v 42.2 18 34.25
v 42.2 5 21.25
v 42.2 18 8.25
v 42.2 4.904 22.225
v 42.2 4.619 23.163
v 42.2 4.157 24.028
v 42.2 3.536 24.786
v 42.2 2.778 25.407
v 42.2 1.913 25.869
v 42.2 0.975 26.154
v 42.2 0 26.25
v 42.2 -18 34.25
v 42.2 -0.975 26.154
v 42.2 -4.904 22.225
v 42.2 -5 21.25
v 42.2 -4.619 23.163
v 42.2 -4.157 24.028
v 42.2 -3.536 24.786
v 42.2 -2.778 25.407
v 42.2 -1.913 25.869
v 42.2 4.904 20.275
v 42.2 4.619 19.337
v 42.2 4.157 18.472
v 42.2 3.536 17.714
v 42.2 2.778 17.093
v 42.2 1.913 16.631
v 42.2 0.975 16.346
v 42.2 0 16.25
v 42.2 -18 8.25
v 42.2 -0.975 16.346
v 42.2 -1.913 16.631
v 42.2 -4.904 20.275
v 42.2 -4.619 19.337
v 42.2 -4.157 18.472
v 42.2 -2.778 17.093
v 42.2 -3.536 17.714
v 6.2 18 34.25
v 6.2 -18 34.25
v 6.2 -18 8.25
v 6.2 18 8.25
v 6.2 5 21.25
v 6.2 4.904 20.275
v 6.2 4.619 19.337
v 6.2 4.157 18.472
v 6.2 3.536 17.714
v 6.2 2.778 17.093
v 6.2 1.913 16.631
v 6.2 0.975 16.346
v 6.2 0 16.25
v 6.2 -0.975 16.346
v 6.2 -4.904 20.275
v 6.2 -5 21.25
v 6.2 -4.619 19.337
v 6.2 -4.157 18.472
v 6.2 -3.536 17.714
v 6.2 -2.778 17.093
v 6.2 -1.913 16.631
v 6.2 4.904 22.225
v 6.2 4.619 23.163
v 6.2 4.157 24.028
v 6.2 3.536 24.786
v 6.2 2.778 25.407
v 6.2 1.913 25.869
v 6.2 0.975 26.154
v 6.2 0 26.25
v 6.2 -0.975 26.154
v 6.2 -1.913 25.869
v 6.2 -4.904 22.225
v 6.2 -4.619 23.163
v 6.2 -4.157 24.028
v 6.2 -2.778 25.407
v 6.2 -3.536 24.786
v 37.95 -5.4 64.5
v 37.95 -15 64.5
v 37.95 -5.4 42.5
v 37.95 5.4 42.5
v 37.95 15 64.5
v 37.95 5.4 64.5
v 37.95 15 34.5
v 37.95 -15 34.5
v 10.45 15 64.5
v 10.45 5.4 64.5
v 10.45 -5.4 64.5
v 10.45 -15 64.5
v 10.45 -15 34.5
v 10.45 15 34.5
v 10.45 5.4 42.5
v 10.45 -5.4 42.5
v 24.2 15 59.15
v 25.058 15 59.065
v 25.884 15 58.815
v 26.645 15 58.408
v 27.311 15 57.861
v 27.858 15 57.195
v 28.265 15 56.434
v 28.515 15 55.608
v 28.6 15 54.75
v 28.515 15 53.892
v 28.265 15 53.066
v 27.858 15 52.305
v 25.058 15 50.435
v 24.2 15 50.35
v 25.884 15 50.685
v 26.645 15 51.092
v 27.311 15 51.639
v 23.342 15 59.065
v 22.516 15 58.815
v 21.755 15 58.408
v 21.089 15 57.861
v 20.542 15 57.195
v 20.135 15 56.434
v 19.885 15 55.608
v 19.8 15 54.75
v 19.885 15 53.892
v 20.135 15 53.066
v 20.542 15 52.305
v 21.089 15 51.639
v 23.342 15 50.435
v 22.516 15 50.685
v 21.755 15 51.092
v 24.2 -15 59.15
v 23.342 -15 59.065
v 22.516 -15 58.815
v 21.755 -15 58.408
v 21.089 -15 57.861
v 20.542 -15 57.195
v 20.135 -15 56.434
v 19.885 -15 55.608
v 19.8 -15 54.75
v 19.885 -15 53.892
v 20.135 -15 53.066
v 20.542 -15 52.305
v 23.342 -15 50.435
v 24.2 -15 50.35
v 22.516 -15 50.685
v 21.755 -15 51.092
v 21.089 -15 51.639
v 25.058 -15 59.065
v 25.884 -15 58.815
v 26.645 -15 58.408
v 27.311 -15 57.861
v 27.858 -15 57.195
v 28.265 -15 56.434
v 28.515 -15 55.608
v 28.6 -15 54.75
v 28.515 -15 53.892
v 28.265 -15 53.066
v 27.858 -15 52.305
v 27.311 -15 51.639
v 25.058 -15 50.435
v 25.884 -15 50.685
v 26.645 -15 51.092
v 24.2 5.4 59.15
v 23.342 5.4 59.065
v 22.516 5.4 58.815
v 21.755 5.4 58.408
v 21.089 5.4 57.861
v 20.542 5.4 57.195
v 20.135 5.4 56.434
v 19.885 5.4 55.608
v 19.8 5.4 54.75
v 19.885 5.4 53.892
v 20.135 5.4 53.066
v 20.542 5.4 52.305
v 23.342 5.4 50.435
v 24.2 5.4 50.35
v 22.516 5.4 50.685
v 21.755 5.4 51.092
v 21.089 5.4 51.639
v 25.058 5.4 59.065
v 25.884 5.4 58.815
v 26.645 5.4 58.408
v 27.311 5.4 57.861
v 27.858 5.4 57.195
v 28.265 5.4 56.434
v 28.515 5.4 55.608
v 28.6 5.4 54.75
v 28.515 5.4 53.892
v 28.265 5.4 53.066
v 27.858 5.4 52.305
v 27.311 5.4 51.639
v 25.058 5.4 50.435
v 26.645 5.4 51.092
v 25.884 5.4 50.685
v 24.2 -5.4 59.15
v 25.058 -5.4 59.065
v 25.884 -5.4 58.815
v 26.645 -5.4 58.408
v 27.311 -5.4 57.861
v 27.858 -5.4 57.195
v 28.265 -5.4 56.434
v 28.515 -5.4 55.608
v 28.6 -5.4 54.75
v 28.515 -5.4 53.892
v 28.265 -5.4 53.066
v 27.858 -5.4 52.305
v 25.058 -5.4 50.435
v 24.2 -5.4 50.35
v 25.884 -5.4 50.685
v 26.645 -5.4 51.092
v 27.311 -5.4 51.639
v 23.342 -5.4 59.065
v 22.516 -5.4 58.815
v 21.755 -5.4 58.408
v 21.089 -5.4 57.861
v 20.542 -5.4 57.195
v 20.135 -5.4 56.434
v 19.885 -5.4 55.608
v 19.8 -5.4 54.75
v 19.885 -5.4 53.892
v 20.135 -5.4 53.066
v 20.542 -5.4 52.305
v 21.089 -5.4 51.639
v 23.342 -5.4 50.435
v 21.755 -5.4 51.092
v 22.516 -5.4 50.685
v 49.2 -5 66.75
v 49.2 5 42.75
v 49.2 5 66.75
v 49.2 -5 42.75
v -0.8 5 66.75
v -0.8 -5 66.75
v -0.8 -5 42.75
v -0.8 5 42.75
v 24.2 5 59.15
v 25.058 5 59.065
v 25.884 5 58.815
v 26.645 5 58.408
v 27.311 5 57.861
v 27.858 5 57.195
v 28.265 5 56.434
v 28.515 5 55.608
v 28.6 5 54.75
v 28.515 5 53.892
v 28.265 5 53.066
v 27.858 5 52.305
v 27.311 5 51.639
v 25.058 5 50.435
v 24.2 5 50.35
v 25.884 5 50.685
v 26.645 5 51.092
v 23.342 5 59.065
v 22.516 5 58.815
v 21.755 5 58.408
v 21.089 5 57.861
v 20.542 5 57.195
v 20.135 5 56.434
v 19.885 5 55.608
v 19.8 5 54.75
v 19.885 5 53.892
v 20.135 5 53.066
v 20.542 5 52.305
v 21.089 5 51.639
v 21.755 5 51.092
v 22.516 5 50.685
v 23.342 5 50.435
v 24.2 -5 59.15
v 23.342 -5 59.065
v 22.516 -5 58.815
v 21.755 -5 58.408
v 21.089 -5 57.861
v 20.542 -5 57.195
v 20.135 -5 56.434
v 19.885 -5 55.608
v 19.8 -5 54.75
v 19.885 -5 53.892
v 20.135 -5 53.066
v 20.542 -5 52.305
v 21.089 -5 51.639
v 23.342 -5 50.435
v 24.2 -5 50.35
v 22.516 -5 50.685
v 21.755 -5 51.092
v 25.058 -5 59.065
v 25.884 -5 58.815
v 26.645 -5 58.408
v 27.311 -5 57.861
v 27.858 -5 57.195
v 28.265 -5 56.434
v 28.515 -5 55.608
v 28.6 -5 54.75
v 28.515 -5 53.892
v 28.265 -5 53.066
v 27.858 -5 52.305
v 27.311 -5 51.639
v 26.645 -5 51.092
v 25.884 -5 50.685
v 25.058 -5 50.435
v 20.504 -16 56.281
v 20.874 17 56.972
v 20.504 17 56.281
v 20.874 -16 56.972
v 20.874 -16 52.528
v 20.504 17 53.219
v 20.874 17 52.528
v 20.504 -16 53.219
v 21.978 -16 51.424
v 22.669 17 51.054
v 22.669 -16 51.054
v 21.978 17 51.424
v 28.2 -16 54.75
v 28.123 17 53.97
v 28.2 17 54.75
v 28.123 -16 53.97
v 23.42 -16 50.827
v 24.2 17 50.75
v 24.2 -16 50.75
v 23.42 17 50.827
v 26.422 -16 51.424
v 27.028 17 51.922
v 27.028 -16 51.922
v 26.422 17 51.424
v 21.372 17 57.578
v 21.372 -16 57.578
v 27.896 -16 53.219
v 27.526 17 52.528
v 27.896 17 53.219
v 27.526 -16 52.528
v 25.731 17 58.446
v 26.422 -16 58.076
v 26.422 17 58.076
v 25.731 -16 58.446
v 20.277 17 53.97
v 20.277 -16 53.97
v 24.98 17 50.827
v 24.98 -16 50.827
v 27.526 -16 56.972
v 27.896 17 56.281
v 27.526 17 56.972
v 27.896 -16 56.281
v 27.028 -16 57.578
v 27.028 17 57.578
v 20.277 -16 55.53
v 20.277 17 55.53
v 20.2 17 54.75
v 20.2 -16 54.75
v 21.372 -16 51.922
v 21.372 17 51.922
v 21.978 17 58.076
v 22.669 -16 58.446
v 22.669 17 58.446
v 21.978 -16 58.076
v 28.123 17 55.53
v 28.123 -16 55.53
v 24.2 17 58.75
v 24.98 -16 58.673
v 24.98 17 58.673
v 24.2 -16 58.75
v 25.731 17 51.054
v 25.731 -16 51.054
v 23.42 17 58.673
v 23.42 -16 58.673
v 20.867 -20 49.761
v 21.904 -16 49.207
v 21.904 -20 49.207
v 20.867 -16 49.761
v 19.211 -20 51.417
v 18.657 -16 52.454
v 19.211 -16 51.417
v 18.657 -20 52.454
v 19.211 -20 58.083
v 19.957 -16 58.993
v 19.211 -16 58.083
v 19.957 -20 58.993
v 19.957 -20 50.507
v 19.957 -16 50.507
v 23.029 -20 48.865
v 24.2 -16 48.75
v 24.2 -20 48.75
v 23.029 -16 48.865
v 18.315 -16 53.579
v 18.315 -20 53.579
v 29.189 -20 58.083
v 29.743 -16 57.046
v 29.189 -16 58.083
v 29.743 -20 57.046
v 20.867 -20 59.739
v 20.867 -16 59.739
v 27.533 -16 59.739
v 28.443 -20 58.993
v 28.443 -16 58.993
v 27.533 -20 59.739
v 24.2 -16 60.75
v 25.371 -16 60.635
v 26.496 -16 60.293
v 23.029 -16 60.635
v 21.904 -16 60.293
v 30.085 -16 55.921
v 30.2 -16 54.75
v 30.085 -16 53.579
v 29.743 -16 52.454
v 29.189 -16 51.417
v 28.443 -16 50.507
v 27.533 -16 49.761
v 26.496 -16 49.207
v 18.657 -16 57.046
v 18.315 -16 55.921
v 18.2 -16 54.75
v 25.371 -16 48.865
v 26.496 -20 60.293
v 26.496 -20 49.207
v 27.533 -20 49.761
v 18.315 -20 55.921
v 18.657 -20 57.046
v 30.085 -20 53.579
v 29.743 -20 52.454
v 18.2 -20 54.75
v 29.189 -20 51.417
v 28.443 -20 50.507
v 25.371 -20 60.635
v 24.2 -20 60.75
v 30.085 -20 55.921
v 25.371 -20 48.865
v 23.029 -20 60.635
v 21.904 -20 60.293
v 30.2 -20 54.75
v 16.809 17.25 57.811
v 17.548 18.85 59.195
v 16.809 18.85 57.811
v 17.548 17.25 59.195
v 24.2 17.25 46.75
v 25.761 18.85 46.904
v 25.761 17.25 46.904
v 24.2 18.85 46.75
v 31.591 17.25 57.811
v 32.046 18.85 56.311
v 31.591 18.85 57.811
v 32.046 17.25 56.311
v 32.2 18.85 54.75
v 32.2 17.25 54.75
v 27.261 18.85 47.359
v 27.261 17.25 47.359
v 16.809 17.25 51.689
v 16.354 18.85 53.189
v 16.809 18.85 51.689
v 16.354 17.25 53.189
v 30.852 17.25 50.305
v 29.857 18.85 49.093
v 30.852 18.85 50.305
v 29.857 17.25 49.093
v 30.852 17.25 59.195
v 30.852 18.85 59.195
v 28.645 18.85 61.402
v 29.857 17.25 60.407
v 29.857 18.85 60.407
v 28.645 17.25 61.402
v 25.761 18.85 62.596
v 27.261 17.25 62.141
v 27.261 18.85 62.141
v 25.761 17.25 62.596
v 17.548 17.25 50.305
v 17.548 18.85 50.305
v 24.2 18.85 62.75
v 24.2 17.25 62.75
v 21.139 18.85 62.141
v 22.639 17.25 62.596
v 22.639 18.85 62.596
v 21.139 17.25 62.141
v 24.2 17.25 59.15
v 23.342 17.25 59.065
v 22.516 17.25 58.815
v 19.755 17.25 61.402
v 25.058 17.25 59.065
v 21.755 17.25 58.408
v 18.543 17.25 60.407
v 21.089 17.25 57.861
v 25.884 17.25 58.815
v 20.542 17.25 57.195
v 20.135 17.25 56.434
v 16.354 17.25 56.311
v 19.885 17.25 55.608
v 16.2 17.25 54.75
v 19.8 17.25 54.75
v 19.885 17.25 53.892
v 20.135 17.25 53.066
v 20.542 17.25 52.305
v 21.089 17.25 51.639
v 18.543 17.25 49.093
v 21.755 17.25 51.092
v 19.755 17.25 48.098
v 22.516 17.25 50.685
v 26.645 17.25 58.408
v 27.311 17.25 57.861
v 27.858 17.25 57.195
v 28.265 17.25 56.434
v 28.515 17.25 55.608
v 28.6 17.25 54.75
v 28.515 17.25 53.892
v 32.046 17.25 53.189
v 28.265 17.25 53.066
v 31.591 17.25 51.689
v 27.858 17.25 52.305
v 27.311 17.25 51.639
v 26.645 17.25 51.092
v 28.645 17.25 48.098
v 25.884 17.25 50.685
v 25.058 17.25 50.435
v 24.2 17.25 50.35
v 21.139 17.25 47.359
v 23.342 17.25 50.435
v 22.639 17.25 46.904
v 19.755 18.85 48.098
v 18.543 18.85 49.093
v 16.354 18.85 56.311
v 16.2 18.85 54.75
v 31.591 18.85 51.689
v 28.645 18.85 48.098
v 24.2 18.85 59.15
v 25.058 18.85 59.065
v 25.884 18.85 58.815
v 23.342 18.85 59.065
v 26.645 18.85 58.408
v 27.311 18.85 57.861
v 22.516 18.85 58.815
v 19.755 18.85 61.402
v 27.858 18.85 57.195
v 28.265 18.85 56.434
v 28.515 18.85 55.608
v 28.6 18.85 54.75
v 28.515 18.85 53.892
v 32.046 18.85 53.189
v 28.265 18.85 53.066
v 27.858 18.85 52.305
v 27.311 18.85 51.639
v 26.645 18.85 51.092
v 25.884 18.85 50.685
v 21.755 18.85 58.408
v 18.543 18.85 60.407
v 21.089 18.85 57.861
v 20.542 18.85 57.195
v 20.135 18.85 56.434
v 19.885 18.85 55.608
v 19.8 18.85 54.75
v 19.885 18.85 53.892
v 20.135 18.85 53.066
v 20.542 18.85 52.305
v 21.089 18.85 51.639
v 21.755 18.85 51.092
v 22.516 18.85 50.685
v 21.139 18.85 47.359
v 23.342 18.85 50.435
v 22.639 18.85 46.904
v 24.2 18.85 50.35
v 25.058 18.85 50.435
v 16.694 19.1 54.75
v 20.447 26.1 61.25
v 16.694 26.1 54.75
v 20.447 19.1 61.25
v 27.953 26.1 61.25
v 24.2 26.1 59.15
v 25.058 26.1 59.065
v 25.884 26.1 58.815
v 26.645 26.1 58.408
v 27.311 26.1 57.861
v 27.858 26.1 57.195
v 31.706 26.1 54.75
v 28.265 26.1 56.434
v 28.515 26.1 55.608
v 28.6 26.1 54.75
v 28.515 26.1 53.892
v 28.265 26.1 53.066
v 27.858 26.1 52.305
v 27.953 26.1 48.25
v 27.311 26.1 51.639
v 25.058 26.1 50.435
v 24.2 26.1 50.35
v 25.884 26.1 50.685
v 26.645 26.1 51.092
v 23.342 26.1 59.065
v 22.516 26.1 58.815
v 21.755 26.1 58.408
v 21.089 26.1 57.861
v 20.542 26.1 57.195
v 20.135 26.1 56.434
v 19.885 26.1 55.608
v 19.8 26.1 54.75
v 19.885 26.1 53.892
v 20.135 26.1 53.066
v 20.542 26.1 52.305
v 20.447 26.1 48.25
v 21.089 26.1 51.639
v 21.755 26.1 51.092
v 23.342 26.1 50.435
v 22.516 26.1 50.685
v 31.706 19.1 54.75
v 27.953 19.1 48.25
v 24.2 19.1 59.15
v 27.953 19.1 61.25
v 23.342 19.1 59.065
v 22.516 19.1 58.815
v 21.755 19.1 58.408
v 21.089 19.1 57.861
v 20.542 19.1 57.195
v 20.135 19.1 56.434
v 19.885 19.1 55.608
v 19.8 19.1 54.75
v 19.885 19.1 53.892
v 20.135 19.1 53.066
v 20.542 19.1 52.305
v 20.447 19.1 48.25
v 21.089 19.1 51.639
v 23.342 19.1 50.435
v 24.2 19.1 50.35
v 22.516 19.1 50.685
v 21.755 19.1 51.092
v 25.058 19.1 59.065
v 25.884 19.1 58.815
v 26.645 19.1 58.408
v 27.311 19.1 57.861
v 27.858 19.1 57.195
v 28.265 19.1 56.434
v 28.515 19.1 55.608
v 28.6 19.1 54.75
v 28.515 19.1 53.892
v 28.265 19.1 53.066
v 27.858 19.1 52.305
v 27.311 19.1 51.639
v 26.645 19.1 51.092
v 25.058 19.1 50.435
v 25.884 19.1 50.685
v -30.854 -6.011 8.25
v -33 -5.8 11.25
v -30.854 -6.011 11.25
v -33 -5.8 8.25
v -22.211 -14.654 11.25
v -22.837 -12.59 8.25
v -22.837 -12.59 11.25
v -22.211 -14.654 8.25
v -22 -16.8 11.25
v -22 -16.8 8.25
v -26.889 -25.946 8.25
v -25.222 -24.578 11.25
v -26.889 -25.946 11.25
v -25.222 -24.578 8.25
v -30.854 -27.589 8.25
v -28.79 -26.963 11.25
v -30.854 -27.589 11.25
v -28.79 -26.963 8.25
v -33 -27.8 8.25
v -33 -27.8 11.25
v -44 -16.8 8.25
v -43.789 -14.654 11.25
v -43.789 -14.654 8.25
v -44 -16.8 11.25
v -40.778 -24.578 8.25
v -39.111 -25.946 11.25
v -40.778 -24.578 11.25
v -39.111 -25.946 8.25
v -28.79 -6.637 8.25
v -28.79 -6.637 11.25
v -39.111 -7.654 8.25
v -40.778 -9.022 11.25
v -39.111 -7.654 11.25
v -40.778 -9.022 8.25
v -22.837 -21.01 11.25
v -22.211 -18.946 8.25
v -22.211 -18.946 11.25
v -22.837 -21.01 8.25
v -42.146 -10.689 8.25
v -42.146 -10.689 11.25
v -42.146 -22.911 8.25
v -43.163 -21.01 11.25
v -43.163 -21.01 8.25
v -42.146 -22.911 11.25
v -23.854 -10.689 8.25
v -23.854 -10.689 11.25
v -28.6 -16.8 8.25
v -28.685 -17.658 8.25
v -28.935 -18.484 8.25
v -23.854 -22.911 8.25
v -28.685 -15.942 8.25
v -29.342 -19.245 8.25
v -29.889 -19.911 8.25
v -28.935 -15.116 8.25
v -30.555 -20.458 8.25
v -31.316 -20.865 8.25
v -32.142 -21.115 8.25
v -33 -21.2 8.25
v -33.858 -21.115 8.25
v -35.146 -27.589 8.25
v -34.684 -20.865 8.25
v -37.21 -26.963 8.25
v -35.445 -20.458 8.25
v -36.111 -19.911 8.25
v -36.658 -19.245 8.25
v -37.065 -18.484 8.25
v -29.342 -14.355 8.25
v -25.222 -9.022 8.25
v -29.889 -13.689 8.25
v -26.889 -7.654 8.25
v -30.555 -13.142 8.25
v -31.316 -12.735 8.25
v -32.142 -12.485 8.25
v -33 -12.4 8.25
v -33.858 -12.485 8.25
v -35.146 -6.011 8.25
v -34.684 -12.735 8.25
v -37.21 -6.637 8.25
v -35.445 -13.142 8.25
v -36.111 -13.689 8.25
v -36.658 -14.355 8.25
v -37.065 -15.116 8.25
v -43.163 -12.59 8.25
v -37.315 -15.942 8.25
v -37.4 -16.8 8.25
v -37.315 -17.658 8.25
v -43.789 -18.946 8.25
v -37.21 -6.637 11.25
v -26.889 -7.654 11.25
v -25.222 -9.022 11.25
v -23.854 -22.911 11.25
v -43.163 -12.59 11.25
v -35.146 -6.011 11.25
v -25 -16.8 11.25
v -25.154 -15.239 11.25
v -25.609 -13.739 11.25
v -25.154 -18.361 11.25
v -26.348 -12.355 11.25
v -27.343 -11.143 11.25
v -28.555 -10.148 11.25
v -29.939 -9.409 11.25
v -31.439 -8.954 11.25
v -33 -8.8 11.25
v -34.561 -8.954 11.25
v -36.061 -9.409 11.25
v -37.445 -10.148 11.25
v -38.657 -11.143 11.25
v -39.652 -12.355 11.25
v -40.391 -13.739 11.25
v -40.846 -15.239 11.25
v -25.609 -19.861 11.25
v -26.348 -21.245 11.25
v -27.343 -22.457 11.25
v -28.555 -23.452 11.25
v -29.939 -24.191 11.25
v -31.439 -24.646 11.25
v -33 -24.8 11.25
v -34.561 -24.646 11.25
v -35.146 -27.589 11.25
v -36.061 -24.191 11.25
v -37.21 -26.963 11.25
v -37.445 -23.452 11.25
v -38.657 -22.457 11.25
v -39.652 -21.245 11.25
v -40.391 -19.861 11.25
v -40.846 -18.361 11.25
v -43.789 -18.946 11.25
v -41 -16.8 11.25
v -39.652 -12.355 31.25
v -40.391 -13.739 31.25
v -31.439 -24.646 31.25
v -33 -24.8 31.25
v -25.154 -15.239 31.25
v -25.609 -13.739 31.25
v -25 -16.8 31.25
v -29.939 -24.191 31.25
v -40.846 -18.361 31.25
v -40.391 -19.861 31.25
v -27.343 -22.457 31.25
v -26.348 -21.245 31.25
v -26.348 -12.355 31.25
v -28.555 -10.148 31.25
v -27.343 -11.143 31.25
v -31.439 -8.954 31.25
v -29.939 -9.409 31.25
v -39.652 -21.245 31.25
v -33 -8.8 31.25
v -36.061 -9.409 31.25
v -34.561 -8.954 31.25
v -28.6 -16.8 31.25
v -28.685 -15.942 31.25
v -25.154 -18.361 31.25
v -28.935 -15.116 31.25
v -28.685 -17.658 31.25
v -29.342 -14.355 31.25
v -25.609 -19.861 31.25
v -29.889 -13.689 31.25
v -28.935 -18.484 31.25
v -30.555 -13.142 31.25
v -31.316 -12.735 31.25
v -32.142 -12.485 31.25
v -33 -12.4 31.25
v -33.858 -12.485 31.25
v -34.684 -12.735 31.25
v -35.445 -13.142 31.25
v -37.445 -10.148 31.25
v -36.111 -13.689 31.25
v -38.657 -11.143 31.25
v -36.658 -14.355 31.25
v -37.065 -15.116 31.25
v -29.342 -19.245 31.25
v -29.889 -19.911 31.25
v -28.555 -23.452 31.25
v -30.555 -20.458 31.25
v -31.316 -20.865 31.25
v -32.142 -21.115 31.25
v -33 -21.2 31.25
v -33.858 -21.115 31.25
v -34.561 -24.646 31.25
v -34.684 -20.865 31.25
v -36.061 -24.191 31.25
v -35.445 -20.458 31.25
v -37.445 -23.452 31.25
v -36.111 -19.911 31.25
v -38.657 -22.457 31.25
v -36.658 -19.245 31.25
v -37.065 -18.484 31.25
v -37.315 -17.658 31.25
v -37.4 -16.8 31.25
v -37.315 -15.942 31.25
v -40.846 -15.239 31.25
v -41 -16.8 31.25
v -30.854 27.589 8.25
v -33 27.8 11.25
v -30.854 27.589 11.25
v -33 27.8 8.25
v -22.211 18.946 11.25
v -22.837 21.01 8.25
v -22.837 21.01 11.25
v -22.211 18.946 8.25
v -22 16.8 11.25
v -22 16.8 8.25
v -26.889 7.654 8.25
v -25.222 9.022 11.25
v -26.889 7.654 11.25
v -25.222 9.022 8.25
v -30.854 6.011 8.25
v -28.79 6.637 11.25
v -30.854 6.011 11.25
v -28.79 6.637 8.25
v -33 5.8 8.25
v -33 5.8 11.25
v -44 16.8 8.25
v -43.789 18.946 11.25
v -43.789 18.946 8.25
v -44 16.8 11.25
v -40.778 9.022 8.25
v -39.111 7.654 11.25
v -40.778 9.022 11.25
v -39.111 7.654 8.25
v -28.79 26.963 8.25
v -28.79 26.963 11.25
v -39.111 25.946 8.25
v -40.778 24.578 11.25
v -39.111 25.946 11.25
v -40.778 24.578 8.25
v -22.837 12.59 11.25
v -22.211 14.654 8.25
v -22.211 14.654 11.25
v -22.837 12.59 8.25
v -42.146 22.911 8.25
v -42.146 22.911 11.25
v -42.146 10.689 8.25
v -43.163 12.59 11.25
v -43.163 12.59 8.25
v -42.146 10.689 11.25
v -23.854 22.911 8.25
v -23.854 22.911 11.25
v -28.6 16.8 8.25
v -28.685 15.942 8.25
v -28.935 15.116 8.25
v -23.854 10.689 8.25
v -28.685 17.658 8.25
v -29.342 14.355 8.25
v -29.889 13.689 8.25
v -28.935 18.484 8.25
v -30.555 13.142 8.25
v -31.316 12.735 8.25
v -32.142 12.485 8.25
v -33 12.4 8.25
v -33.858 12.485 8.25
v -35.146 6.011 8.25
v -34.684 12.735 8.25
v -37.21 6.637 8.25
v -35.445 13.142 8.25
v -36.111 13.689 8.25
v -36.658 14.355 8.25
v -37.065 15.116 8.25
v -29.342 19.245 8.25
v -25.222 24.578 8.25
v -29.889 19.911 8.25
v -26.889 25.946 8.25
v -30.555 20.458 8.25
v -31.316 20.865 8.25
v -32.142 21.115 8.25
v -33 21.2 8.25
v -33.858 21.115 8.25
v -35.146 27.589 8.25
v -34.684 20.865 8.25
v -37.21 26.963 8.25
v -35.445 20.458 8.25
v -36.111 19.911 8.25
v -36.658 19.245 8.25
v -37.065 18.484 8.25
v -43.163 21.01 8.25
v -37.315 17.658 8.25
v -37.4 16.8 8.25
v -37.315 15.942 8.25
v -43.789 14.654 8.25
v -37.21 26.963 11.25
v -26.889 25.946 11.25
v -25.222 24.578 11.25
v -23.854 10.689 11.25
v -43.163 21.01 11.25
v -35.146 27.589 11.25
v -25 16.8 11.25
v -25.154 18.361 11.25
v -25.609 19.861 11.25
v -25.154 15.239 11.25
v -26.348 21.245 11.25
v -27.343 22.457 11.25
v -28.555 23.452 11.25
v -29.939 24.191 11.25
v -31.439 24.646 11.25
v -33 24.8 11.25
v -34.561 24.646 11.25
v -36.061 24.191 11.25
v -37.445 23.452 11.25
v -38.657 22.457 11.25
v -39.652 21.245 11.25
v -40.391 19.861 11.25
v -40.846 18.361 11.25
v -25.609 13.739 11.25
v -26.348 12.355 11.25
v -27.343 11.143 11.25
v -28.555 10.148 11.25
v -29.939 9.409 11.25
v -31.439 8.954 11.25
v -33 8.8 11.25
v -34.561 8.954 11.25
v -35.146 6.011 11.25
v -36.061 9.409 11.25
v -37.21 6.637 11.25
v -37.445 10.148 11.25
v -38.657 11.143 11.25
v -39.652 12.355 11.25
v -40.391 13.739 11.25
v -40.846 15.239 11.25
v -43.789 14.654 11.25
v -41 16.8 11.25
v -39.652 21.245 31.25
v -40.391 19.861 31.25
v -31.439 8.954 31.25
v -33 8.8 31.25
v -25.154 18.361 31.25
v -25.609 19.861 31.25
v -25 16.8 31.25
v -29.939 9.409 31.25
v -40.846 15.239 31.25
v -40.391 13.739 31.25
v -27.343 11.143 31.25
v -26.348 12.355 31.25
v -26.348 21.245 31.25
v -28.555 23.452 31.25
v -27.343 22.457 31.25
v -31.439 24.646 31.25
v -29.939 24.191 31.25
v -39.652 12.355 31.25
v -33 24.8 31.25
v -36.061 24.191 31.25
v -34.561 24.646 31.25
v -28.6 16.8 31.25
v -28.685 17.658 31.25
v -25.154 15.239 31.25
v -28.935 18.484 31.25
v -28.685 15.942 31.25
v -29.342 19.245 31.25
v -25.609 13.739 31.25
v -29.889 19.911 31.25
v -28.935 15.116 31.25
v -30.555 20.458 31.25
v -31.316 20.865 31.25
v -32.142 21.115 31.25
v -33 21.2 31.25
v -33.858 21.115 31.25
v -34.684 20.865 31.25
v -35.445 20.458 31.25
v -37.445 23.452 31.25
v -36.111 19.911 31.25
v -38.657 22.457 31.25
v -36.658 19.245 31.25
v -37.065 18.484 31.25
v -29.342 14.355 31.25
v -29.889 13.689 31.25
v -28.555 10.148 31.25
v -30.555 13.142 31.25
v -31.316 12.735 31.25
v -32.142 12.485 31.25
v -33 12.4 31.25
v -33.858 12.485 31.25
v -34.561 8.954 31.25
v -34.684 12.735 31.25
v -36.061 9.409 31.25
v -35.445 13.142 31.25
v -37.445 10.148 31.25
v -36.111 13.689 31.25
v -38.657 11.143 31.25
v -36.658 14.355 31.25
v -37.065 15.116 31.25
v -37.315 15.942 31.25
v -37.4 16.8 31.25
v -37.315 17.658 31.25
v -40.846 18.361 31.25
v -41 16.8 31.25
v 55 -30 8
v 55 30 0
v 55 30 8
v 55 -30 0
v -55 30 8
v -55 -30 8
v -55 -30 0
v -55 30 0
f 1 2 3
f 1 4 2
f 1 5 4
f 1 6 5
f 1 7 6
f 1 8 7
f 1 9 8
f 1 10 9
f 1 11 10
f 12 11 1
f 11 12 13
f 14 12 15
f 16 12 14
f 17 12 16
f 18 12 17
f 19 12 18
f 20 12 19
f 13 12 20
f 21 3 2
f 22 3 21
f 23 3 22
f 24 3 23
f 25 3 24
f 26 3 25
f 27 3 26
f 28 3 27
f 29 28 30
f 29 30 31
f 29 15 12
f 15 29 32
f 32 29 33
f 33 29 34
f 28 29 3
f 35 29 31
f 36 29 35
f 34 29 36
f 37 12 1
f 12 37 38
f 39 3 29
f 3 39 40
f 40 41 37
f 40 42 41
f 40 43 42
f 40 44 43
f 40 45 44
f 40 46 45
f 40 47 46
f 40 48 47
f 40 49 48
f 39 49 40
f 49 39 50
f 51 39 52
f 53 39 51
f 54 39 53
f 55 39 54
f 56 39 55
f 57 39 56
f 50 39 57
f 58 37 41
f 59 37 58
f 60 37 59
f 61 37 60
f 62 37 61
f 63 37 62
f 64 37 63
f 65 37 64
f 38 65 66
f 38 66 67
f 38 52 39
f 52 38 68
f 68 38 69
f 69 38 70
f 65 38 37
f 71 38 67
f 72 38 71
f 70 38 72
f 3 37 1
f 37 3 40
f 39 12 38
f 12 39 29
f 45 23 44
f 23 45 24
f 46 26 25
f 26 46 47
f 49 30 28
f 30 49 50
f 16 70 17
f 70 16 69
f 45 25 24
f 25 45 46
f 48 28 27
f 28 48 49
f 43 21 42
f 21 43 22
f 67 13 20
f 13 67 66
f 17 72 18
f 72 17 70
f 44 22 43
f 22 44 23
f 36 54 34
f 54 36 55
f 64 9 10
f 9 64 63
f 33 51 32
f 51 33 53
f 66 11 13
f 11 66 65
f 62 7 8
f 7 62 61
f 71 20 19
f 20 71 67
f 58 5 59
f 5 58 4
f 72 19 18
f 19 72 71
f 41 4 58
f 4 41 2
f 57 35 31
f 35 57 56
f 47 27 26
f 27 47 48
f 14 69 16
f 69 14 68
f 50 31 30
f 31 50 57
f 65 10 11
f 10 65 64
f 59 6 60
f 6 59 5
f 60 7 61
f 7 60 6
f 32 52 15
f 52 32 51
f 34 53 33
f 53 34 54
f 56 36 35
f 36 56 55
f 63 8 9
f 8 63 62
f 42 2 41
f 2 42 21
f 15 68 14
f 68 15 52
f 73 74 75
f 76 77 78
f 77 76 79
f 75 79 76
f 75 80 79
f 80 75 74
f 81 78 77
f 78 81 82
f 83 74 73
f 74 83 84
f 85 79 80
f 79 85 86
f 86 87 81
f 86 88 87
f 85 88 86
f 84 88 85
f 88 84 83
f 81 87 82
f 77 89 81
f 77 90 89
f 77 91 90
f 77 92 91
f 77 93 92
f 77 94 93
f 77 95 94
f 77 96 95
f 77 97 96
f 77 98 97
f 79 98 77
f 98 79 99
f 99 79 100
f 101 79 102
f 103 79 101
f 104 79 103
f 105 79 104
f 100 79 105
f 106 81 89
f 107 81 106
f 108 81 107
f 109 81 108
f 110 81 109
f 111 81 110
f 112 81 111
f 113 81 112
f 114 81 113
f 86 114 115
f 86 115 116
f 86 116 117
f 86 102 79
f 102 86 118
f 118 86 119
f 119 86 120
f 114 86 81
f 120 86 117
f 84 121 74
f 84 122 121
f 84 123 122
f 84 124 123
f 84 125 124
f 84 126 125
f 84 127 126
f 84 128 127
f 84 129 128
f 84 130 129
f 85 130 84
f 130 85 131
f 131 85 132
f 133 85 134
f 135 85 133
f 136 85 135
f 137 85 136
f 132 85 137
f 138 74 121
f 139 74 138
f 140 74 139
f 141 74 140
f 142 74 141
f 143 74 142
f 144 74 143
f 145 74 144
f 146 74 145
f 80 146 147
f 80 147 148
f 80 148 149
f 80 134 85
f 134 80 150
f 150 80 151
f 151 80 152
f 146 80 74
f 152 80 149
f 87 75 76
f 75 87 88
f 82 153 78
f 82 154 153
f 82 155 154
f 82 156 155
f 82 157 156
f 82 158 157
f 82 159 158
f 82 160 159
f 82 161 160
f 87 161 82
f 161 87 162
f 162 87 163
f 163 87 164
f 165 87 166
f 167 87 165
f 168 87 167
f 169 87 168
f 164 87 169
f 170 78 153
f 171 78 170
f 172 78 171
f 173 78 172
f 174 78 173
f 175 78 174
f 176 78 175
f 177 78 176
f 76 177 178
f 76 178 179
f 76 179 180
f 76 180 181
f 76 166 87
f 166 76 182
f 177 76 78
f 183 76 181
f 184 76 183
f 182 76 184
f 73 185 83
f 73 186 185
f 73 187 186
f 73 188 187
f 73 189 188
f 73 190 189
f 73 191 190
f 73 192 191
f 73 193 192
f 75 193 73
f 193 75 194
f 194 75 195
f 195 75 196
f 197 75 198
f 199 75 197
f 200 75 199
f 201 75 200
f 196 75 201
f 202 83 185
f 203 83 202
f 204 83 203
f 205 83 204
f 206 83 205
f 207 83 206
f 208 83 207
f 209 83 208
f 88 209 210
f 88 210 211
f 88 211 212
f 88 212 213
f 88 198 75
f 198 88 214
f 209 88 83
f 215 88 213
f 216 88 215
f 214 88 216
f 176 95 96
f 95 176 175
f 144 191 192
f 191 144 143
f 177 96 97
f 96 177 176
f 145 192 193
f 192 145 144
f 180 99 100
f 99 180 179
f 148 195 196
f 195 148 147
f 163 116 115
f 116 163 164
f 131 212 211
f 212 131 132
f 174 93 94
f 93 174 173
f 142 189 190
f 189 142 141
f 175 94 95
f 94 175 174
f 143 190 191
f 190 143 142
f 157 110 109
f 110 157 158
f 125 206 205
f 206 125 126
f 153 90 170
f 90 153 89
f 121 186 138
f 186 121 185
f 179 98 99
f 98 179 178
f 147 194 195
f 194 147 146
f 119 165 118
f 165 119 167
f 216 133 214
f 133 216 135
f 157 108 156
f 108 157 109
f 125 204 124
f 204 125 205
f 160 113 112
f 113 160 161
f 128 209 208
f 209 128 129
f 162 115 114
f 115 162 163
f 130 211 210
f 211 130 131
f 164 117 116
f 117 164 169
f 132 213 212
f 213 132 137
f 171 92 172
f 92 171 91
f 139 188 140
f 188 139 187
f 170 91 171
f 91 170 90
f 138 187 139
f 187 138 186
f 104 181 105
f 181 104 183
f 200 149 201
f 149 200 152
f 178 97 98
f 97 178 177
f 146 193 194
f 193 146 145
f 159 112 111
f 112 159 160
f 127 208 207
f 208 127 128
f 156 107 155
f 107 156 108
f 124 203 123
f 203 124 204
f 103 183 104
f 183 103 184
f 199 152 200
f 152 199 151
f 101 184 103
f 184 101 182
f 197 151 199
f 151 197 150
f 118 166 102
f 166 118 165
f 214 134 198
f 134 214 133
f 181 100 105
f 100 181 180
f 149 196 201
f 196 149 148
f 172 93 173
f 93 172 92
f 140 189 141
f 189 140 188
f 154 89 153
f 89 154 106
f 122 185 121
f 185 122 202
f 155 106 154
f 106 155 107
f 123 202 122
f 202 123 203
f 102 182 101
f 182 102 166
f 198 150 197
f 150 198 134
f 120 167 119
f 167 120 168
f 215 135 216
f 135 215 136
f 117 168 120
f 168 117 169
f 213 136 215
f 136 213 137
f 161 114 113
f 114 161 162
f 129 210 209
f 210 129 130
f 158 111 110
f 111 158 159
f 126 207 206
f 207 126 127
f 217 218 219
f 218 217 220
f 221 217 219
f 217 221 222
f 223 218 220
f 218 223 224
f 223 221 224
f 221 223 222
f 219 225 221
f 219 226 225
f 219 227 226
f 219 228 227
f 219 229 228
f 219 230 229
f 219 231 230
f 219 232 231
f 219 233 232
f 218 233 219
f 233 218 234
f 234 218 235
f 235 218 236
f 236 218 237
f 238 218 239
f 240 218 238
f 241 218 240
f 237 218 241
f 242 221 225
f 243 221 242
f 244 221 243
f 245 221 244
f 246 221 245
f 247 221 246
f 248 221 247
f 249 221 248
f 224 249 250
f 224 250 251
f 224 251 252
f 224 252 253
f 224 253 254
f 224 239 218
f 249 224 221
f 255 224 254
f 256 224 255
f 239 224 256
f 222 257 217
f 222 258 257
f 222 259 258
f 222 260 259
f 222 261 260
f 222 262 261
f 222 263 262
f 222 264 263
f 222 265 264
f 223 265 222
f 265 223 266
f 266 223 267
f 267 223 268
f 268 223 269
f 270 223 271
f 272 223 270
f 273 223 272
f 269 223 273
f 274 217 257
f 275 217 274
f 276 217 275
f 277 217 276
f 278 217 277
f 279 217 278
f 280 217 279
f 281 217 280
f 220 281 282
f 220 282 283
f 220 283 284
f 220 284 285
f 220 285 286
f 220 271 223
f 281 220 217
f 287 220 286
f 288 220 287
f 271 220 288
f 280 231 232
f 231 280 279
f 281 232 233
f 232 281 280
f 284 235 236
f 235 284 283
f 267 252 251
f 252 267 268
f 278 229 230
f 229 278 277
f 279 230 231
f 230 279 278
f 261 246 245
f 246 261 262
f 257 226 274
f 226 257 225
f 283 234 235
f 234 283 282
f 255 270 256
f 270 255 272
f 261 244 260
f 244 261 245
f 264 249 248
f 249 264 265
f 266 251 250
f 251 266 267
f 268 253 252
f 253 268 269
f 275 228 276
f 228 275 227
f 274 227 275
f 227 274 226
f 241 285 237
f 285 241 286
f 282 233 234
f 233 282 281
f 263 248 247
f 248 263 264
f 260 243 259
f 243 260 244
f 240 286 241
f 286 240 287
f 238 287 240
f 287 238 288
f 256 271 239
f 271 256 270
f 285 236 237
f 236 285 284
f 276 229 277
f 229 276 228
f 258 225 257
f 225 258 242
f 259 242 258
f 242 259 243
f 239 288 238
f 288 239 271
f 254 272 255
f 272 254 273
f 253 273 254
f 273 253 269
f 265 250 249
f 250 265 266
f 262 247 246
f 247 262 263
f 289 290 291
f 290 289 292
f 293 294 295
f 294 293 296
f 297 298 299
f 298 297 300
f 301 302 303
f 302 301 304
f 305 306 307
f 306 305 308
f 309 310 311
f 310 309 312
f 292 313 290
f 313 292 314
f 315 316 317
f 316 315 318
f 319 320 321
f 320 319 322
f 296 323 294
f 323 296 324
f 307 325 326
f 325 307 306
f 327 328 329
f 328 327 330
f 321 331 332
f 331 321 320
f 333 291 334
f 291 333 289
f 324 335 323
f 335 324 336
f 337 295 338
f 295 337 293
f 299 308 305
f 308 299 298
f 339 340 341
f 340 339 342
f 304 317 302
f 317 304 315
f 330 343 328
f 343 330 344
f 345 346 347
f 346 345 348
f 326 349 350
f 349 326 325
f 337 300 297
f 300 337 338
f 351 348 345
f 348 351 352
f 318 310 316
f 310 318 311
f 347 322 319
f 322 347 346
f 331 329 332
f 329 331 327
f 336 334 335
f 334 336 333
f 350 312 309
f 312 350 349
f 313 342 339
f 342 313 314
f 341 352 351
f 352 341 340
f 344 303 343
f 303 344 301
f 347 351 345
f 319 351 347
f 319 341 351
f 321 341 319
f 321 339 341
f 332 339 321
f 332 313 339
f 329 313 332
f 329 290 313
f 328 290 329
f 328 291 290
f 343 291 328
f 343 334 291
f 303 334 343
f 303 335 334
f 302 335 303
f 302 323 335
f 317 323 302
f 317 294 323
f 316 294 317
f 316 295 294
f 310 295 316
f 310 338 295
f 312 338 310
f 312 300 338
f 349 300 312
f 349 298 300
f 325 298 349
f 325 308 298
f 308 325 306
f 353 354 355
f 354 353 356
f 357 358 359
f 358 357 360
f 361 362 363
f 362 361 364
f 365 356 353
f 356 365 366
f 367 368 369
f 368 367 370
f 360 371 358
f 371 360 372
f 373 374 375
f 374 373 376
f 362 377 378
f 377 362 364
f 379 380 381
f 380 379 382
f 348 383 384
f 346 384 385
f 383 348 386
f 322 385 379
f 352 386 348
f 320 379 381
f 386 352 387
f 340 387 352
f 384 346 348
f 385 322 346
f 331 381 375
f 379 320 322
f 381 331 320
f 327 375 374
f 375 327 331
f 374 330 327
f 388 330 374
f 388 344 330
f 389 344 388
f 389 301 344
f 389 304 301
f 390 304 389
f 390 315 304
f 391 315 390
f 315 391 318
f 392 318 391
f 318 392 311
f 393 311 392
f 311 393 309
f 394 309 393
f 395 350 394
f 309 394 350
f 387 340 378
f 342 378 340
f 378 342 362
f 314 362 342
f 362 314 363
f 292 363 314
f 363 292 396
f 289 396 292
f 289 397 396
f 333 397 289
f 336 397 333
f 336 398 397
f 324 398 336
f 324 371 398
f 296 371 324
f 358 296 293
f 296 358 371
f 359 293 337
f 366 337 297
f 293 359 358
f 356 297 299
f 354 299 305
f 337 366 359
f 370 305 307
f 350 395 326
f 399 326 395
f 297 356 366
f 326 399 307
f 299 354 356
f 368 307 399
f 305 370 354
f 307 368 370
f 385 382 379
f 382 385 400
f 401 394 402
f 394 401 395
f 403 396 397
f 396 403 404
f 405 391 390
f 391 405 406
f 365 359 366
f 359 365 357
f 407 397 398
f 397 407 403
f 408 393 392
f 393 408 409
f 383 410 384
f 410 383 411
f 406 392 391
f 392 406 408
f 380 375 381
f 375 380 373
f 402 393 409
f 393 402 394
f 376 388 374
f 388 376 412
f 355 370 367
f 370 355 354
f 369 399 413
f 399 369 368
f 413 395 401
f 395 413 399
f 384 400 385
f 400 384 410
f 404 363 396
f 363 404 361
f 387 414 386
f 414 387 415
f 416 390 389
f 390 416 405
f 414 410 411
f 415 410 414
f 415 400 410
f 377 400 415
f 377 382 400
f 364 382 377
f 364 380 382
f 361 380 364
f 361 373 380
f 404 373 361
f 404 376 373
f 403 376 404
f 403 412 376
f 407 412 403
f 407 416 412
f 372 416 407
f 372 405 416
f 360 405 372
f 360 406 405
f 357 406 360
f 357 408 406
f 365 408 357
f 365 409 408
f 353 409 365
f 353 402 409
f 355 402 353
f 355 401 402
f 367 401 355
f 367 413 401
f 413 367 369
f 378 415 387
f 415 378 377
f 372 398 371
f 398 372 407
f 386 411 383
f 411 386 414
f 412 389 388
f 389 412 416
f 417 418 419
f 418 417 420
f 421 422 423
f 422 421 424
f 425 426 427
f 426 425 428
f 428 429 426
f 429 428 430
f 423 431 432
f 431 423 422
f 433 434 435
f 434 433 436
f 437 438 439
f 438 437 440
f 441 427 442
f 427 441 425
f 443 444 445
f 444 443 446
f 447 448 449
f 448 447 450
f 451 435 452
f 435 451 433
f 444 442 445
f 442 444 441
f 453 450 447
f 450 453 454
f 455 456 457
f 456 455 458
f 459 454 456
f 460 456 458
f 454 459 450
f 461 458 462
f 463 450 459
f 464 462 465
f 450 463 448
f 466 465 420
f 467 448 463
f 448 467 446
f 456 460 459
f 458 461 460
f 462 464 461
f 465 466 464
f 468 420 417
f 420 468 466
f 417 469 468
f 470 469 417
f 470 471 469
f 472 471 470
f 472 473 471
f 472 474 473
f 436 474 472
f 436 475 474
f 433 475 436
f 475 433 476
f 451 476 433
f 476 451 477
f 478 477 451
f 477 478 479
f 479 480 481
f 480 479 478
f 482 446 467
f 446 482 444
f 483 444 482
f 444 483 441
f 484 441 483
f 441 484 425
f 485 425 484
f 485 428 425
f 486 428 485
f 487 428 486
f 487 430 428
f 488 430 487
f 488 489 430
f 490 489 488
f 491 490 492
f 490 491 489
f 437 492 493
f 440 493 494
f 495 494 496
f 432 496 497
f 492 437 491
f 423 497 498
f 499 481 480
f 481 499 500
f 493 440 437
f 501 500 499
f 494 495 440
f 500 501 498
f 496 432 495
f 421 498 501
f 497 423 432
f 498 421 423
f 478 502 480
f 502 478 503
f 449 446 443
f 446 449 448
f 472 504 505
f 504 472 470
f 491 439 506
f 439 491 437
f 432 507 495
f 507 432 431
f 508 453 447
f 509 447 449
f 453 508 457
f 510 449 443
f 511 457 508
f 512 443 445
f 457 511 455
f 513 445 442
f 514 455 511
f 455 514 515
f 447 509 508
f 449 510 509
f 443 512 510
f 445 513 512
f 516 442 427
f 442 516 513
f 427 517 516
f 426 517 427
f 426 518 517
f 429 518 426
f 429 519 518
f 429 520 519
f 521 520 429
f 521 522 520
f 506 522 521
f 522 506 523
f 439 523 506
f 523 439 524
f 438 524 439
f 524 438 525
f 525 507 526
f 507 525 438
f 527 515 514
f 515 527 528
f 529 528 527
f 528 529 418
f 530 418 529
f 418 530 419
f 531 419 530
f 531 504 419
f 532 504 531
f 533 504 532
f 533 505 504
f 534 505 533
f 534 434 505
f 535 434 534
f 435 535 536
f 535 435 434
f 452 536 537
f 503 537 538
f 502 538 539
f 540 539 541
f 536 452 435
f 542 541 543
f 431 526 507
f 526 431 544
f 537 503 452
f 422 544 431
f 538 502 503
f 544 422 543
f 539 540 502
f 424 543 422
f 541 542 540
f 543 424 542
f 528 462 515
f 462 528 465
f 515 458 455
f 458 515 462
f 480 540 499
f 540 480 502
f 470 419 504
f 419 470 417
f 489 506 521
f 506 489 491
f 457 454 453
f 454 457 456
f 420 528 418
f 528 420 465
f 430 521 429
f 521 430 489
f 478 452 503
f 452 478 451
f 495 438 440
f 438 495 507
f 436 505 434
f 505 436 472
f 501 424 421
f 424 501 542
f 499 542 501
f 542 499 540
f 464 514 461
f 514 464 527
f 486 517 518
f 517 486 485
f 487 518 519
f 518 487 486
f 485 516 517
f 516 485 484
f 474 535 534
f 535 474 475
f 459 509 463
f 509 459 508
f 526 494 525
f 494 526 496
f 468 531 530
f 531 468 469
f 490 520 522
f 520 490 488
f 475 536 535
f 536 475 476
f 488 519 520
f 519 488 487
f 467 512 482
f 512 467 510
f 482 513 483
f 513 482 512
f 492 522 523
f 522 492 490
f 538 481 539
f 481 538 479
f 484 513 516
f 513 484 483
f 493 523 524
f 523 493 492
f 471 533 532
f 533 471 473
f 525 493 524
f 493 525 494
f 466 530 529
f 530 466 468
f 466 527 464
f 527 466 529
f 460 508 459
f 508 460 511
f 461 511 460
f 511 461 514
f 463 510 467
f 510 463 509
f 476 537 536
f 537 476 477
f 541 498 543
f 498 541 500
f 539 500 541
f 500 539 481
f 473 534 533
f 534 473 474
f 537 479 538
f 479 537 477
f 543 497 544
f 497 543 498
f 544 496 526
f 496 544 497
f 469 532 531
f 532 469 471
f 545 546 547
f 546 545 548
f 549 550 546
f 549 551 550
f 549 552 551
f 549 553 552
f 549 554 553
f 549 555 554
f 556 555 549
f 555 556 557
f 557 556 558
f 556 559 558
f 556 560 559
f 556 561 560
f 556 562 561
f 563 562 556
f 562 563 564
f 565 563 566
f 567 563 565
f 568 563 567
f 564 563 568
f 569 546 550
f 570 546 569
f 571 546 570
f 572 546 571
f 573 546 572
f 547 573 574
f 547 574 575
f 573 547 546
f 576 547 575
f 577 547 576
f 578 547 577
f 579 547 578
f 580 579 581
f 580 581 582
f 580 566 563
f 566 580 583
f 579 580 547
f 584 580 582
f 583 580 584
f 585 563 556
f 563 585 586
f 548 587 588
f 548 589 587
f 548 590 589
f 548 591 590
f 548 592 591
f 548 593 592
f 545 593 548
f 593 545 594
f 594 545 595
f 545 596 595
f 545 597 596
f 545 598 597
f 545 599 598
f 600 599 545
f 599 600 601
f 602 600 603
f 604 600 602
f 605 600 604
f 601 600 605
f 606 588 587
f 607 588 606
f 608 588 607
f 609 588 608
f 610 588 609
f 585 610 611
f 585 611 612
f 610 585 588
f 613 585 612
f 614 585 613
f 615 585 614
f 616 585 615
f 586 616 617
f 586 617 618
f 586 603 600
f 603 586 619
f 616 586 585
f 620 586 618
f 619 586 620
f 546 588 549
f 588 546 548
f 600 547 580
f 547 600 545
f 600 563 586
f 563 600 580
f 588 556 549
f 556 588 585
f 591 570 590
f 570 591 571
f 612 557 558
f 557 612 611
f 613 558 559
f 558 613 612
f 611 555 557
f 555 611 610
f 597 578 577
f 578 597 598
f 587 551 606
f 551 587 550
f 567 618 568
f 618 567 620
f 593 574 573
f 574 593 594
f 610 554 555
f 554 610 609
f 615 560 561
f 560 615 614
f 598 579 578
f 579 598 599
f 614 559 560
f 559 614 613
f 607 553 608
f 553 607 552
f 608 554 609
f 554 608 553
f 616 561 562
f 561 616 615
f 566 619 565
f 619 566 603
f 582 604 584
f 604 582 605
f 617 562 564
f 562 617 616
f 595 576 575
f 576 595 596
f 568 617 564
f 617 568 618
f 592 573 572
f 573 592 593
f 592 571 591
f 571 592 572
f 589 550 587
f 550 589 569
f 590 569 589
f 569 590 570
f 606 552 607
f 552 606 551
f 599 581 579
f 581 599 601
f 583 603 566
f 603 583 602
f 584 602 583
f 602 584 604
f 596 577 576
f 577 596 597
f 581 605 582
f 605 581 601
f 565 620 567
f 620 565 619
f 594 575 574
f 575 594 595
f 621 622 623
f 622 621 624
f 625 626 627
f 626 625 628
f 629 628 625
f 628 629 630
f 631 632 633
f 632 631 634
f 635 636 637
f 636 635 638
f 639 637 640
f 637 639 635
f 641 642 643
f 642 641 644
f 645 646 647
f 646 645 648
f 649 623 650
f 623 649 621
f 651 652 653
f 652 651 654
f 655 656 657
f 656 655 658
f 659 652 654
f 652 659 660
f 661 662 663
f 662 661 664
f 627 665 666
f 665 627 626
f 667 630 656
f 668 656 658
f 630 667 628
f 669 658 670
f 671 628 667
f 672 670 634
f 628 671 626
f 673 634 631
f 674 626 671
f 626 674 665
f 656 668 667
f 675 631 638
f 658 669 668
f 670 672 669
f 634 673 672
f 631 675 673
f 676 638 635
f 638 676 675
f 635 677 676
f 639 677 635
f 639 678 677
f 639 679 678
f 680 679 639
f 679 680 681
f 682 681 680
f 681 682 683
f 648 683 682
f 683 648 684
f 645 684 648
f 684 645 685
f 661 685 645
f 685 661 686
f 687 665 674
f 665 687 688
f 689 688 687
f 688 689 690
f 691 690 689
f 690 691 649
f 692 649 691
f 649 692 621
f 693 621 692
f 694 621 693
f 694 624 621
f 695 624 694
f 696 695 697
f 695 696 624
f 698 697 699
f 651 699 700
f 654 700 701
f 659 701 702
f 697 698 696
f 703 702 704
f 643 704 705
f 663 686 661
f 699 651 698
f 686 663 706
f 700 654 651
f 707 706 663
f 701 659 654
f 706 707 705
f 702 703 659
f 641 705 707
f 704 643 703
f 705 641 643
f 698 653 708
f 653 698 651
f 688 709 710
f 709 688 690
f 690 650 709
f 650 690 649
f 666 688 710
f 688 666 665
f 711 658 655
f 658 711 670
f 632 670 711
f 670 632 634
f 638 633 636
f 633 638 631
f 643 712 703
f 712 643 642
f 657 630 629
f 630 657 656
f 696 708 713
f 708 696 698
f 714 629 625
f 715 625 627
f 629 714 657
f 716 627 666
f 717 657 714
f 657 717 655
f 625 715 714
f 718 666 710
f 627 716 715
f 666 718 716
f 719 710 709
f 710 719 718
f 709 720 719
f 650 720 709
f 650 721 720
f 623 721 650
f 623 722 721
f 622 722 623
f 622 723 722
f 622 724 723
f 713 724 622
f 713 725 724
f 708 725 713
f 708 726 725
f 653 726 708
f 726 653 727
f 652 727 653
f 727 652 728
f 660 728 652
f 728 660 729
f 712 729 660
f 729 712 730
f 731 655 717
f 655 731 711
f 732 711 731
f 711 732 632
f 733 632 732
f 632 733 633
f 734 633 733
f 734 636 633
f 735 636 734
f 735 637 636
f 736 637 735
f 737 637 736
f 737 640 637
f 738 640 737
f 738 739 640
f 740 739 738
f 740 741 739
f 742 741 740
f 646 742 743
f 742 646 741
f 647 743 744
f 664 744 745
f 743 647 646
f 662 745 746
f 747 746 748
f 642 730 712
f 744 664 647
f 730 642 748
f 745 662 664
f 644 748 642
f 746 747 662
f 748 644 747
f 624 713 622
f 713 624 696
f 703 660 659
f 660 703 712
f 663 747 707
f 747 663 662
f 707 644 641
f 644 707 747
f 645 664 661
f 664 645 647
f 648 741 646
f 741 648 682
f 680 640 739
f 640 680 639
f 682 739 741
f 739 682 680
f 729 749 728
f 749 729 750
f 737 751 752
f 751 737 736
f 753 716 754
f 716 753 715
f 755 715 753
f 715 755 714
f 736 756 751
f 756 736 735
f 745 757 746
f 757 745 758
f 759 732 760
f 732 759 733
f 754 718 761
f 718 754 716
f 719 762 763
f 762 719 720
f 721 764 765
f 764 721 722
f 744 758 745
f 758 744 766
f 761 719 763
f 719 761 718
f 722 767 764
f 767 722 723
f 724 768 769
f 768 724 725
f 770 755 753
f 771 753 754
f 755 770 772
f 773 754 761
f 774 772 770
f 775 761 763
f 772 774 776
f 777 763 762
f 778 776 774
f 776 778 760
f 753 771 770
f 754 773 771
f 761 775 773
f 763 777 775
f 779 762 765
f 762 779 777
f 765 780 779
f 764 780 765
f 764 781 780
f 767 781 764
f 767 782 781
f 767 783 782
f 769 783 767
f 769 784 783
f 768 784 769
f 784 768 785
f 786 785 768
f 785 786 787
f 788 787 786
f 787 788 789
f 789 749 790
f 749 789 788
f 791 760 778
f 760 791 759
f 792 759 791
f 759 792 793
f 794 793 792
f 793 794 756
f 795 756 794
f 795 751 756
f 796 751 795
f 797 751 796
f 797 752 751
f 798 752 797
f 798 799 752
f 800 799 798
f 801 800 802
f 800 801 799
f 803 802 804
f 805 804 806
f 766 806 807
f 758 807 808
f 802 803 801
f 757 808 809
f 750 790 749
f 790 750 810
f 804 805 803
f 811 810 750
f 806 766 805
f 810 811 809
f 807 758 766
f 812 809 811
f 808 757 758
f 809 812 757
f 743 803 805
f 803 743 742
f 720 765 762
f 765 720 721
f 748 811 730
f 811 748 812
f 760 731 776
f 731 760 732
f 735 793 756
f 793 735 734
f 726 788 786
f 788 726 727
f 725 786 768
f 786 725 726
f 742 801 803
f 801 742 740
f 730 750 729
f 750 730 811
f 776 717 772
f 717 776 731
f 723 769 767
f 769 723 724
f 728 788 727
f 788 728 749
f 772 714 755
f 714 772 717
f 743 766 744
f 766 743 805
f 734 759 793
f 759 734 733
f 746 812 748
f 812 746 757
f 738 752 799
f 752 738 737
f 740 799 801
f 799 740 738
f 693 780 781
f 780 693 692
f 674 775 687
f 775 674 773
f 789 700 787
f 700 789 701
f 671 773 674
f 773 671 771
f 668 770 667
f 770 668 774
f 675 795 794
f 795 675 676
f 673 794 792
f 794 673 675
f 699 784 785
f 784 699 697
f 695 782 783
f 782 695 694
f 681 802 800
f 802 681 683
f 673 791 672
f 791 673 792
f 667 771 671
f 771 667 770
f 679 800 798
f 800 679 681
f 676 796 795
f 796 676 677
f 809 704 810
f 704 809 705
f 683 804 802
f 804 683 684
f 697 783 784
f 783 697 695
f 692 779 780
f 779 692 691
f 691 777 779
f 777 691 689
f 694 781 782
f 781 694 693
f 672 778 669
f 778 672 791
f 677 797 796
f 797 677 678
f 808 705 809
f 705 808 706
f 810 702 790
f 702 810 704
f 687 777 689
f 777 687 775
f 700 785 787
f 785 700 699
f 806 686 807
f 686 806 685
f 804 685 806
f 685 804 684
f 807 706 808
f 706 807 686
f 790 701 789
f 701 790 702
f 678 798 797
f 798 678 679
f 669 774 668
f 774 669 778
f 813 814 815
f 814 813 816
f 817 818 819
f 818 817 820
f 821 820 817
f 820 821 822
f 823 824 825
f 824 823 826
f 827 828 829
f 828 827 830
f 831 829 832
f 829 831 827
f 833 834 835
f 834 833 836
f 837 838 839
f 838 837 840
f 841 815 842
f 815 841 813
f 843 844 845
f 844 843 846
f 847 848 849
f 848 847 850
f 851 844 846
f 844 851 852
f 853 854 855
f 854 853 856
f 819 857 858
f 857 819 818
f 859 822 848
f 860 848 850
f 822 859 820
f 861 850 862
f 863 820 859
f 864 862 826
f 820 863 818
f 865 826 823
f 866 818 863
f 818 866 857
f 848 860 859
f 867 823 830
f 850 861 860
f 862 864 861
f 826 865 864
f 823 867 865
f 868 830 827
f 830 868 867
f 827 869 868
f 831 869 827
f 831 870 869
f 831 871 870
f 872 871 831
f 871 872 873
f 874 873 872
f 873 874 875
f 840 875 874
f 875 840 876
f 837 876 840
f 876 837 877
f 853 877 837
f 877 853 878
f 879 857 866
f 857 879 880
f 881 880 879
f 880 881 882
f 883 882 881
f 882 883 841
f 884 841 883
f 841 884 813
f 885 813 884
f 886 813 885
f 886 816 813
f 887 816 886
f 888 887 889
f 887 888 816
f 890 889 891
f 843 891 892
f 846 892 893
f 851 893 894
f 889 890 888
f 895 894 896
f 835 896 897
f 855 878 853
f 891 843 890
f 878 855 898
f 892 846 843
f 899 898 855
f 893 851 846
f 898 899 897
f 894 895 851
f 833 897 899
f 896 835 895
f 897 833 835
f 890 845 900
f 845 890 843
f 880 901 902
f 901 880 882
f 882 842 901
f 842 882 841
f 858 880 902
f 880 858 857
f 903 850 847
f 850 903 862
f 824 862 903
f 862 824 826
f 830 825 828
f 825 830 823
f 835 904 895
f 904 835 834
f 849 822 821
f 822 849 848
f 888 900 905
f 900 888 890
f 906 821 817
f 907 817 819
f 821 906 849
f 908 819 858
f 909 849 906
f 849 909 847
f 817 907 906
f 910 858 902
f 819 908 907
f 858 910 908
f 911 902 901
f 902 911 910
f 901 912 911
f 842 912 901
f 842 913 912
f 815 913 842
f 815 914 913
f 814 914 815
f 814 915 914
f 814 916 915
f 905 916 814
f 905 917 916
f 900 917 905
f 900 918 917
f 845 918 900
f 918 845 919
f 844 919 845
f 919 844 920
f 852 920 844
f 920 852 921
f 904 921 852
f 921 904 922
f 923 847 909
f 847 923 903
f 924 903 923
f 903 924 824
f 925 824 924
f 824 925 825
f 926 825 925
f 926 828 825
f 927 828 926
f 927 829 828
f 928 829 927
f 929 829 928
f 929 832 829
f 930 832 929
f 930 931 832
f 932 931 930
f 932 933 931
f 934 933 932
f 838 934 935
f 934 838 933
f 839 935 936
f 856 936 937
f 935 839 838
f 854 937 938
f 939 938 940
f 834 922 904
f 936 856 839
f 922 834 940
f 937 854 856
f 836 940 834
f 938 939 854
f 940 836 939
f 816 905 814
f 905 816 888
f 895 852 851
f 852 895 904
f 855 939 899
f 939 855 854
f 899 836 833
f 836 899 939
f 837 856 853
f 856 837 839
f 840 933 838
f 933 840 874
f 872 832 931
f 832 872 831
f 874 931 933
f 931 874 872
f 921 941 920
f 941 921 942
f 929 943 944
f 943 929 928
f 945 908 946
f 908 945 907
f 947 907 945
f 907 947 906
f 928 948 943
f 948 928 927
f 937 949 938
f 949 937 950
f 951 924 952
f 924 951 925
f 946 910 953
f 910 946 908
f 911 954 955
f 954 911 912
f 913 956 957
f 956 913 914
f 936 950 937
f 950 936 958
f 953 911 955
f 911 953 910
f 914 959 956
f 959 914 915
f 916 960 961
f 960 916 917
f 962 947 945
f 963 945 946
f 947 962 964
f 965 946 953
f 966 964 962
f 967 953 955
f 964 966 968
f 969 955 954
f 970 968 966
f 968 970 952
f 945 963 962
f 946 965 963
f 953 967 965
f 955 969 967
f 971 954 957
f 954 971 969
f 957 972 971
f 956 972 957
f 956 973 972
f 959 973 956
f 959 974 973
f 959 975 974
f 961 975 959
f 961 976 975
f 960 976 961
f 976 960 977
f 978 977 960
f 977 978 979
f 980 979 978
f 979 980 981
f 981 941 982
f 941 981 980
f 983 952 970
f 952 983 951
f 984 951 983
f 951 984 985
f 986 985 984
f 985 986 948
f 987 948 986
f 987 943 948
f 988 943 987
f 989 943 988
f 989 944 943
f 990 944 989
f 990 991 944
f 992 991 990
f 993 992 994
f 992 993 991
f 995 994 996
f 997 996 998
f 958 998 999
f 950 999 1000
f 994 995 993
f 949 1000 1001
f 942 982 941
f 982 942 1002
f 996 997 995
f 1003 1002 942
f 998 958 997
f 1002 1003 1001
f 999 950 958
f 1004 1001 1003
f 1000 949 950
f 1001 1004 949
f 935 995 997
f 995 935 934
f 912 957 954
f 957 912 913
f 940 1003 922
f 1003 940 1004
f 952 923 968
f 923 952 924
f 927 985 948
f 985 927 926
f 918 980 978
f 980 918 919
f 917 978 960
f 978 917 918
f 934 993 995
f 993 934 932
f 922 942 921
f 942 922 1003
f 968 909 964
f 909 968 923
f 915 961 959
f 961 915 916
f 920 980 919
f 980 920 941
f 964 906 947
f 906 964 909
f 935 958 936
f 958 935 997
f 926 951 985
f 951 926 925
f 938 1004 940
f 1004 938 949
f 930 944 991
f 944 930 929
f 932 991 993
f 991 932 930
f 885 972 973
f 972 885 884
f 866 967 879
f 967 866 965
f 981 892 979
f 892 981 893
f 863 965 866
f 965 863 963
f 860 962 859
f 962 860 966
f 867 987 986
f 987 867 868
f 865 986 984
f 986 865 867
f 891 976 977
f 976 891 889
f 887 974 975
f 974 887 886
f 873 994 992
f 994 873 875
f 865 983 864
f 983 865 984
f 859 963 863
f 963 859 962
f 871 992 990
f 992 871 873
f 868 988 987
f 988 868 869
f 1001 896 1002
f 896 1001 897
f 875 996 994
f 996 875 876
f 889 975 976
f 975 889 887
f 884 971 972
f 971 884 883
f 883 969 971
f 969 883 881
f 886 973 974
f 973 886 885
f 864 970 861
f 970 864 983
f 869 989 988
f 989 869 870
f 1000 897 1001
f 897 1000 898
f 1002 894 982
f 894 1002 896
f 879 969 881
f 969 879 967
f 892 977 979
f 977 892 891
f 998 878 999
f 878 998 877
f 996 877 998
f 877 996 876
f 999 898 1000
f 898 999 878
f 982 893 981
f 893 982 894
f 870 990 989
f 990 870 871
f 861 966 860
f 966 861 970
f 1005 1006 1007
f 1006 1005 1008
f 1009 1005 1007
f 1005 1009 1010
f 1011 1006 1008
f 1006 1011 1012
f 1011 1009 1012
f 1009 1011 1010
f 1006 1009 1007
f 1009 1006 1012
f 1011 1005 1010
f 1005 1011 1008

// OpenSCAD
$fn = 32;

// ------------------------------------------------------------------------
// Indexing jig: plate 110 x 60 mm, pin d8
// Every part is its own module, assembly() places every instance.
// ------------------------------------------------------------------------

// --- part 1 ---
module jig_plate() {
  difference() {
    translate([-55, -30, 0]) cube([110, 60, 8]);
  }
}

// --- part 2 ---
module locator_block() {
  difference() {
    translate([-18, -18, 0]) cube([36, 36, 26]);
    translate([0, 0, 13]) rotate([0, 90, 0]) cylinder(h = 38, d = 10, center = true);
  }
}

// --- part 3 ---
module index_fork() {
  difference() {
    translate([-13.75, -15, 0]) cube([27.5, 30, 30]);
    translate([-14.75, -5.4, 8]) cube([29.5, 10.8, 23]);
    translate([0, 0, 20.25]) rotate([90, 0, 0]) cylinder(h = 32, d = 8.8, center = true);
  }
}

// --- part 4 ---
module index_arm() {
  difference() {
    translate([-25, -5, 0]) cube([50, 10, 24]);
    translate([0, 0, 12]) rotate([90, 0, 0]) cylinder(h = 12, d = 8.8, center = true);
  }
}

// --- part 5 ---
module index_pin() {
  rotate([0, 90, 0]) cylinder(h = 34, d = 8, center = true);
  translate([-20, 0, 0]) rotate([0, 90, 0]) cylinder(h = 4, d = 12);
}

// --- part 6 ---
module pin_washer() {
  difference() {
      translate([0, 0, 0]) cylinder(h = 1.6, d = 16);
      translate([0, 0, -1]) cylinder(h = 3.6, d = 8.8);
    }
}

// --- part 7 ---
module lock_nut() {
  difference() {
    linear_extrude(height = 7) polygon(points = [[7.506, 0], [3.753, 6.5], [-3.753, 6.5], [-7.506, 0], [-3.753, -6.5], [3.753, -6.5]]);
    translate([0, 0, -1]) cylinder(h = 9, d = 8.8);
  }
}

// --- part 8 ---
module guide_bush_a() {
  difference() {
    union() {
      cylinder(h = 3, d = 22);
      translate([0, 0, 3]) cylinder(h = 20, d = 16);
    }
    translate([0, 0, -1]) cylinder(h = 25, d = 8.8);
  }
}

// --- part 9 ---
module guide_bush_b() {
  difference() {
    union() {
      cylinder(h = 3, d = 22);
      translate([0, 0, 3]) cylinder(h = 20, d = 16);
    }
    translate([0, 0, -1]) cylinder(h = 25, d = 8.8);
  }
}

// --- assembly ---
module assembly() {
  color([0.80, 0.24, 0.20]) translate([0, 0, 0]) rotate([0, 0, 0]) jig_plate();
  color([0.20, 0.45, 0.75]) translate([24.2, 0, 8.25]) rotate([0, 0, 0]) locator_block();
  color([0.25, 0.62, 0.32]) translate([24.2, 0, 34.5]) rotate([0, 0, 0]) index_fork();
  color([0.92, 0.70, 0.18]) translate([24.2, 0, 42.75]) rotate([0, 0, 0]) index_arm();
  color([0.58, 0.35, 0.70]) translate([24.2, 0, 54.75]) rotate([0, 0, 90]) index_pin();
  color([0.16, 0.66, 0.66]) translate([24.2, 18.85, 54.75]) rotate([90, 0, 0]) pin_washer();
  color([0.85, 0.48, 0.18]) translate([24.2, 26.1, 54.75]) rotate([90, 0, 0]) lock_nut();
  color([0.55, 0.60, 0.65]) translate([-33, -16.8, 8.25]) rotate([0, 0, 0]) guide_bush_a();
  color([0.75, 0.30, 0.55]) translate([-33, 16.8, 8.25]) rotate([0, 0, 0]) guide_bush_b();
}

assembly();
